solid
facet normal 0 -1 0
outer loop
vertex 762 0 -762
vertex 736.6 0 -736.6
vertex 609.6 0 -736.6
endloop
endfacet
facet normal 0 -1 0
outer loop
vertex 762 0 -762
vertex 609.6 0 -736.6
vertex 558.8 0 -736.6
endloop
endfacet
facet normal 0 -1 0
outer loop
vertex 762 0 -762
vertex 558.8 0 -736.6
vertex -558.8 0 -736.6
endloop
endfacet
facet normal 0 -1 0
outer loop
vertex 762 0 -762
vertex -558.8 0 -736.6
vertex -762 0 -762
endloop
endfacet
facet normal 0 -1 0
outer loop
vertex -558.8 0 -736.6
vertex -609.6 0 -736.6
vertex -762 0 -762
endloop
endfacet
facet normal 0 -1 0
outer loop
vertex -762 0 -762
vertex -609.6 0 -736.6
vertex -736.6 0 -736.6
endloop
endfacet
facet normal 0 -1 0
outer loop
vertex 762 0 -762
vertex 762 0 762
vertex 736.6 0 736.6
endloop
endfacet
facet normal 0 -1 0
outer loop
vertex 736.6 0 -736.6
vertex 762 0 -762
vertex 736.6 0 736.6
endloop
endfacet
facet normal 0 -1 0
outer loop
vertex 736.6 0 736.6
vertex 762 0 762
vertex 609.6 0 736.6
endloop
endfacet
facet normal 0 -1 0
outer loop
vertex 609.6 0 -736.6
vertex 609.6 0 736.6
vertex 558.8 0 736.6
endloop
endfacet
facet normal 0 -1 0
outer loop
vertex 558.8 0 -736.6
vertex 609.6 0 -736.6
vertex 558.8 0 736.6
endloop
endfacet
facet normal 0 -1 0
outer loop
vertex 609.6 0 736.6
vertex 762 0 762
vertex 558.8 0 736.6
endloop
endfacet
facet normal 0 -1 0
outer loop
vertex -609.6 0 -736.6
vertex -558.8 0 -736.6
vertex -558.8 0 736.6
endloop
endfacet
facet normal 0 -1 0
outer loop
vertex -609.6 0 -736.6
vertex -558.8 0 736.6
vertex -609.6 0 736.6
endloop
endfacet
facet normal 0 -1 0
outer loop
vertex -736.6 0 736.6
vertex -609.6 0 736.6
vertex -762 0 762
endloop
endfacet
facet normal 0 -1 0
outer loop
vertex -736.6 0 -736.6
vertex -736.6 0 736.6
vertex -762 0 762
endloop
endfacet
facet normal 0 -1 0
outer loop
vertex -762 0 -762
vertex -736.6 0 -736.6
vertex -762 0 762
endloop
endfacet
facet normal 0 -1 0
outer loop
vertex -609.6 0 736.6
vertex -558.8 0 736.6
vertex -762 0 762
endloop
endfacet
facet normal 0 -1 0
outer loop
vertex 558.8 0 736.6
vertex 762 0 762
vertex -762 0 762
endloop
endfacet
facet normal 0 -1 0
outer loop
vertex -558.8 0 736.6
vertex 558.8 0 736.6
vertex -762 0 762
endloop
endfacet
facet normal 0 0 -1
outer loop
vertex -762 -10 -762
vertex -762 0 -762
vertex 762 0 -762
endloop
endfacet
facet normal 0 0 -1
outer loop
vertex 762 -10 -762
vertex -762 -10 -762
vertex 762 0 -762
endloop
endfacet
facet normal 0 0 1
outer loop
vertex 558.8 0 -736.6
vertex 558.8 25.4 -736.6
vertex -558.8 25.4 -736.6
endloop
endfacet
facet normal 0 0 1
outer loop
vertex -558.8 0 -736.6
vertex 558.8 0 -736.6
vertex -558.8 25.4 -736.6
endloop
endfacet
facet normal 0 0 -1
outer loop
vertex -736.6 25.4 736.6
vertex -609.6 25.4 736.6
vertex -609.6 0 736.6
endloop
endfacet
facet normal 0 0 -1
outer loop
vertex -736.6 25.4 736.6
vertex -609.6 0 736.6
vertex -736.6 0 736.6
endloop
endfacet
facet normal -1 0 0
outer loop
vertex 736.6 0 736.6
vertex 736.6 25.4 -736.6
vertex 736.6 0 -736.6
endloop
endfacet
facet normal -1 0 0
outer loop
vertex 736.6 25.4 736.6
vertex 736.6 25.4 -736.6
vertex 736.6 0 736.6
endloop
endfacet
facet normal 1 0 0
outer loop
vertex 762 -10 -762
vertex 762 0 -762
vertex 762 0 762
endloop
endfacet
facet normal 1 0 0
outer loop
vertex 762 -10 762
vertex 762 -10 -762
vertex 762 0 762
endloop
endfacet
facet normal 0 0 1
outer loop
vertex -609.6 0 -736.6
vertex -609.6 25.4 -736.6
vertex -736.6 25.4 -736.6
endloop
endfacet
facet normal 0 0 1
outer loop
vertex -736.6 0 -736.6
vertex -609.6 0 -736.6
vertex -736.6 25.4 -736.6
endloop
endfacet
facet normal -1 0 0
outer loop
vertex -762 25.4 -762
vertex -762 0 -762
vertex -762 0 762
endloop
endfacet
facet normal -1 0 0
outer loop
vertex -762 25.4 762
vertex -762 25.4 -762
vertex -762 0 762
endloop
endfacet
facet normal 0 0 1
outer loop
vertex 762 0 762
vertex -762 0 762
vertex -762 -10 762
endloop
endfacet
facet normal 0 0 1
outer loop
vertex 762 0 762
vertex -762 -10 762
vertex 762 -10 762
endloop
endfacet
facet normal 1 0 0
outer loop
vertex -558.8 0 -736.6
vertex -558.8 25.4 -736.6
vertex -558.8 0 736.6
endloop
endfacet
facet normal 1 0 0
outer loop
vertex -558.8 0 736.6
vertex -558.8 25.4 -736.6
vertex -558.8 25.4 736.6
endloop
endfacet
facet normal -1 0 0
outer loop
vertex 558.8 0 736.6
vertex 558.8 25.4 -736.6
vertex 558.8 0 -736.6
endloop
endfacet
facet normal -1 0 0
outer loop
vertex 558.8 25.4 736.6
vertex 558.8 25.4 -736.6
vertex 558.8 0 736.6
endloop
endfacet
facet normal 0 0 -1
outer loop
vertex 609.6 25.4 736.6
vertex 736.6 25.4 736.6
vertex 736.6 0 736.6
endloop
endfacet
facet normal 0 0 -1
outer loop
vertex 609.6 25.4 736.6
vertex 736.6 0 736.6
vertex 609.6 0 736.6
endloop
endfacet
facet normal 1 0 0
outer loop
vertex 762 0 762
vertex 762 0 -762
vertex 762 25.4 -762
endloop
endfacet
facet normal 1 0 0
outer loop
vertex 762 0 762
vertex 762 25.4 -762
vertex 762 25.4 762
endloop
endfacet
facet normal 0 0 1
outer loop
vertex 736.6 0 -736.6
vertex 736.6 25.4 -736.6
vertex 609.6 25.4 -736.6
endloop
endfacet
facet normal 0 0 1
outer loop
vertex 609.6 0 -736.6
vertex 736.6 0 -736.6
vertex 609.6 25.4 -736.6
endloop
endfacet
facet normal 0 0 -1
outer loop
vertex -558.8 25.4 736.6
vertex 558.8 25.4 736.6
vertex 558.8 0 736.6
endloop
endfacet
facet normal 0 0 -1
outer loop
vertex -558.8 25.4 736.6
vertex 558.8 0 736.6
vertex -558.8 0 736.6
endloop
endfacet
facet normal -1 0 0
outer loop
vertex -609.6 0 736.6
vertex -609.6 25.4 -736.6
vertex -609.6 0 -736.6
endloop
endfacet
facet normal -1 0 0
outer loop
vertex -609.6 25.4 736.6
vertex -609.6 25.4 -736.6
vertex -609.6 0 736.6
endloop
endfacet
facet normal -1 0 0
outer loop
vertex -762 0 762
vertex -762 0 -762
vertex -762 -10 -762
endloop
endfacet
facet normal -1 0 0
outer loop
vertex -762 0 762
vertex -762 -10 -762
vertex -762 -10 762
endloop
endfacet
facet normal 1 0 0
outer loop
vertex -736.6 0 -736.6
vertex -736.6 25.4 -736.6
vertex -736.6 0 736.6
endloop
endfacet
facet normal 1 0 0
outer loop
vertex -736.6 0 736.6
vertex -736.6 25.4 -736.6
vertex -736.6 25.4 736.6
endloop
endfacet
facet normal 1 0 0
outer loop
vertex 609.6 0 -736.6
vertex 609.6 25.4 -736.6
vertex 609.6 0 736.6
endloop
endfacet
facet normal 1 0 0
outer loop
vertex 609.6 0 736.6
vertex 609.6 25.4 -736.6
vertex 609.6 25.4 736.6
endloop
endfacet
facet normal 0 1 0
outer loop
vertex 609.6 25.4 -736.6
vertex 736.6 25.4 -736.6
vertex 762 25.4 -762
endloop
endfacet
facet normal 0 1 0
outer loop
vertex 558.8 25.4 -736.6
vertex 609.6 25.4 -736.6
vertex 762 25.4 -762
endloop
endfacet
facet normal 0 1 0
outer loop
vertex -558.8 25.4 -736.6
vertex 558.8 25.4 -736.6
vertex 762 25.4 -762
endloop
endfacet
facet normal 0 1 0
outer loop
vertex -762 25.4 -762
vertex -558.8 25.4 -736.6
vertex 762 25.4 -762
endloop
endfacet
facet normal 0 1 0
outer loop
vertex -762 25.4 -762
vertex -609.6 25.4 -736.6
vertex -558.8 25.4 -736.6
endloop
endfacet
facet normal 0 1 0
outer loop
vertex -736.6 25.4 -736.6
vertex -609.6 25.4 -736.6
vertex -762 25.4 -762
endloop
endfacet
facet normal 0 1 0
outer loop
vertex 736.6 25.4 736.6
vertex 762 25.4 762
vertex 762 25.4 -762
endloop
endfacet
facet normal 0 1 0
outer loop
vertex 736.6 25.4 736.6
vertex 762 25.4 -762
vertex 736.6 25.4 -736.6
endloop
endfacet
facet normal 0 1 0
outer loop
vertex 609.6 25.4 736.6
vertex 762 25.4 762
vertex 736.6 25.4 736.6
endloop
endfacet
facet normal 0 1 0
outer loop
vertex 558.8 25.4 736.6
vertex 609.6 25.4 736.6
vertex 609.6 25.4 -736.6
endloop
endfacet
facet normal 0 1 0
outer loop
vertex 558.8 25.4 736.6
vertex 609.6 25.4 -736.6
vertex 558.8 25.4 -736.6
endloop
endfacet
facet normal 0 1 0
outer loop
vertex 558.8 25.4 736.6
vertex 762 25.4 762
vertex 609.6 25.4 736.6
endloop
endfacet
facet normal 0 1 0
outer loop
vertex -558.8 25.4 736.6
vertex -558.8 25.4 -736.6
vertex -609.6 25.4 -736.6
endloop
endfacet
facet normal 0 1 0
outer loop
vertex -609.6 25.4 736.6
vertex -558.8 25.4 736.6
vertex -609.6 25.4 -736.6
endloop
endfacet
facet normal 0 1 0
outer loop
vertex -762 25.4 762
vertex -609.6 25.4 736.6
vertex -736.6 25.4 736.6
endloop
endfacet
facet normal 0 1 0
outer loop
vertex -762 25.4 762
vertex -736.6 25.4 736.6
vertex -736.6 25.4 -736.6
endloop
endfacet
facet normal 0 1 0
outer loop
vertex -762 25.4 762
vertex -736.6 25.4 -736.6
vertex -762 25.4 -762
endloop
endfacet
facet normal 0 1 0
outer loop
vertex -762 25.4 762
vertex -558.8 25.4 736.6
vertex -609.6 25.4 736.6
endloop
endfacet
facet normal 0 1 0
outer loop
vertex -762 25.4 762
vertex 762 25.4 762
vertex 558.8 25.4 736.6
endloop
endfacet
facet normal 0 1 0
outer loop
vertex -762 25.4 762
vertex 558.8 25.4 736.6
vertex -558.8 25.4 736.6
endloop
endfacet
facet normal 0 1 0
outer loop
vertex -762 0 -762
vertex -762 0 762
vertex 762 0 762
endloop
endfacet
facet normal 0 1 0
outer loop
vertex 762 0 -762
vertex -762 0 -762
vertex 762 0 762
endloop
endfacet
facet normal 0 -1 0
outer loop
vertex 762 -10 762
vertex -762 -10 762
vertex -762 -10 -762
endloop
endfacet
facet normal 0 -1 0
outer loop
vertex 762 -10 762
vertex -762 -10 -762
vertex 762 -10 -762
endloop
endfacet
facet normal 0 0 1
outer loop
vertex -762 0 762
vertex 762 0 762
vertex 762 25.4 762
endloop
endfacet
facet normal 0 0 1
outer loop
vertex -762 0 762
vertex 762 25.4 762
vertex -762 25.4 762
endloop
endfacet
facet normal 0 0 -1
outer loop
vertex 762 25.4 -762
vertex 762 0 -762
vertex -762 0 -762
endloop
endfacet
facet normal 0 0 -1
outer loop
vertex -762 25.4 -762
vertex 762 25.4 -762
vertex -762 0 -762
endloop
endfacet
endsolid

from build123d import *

# Parameters (mm, degrees)
F0_W     = 1524
F0_H     = 1524
F1_DEPTH = 10
F2_W     = 1524
F2_H     = 1524
F3_DEPTH = 25.4
F4_W     = 127
F4_H     = 1473.2
F4_W_2   = 1117.6
F5_DEPTH = 25.4


with BuildPart() as f1:
    # F0 (on Front) → F1 (new body)
    with BuildSketch(Plane.XZ):
        Rectangle(F0_W, F0_H)
    extrude(amount=F1_DEPTH)


with BuildPart() as f3:
    # F2 (on face) → F3 (new body)
    with BuildSketch(Plane(origin=(0, 0, 0), x_dir=(-1, 0, 0), z_dir=(0, 1, 0))):
        Rectangle(F2_W, F2_H)
    extrude(amount=F3_DEPTH)

    # F4 (on face) → F5 (cut)
    with BuildSketch(Plane(origin=(0, 25.4, 0), x_dir=(-1, 0, 0), z_dir=(0, 1, 0))):
        with Locations((-673.1, 0)):
            Rectangle(F4_W, F4_H)
        Rectangle(F4_W_2, F4_H)
        with Locations((673.1, 0)):
            Rectangle(F4_W, F4_H)
    extrude(amount=-F5_DEPTH, mode=Mode.SUBTRACT)


solid = Compound([f1.part, f3.part])
